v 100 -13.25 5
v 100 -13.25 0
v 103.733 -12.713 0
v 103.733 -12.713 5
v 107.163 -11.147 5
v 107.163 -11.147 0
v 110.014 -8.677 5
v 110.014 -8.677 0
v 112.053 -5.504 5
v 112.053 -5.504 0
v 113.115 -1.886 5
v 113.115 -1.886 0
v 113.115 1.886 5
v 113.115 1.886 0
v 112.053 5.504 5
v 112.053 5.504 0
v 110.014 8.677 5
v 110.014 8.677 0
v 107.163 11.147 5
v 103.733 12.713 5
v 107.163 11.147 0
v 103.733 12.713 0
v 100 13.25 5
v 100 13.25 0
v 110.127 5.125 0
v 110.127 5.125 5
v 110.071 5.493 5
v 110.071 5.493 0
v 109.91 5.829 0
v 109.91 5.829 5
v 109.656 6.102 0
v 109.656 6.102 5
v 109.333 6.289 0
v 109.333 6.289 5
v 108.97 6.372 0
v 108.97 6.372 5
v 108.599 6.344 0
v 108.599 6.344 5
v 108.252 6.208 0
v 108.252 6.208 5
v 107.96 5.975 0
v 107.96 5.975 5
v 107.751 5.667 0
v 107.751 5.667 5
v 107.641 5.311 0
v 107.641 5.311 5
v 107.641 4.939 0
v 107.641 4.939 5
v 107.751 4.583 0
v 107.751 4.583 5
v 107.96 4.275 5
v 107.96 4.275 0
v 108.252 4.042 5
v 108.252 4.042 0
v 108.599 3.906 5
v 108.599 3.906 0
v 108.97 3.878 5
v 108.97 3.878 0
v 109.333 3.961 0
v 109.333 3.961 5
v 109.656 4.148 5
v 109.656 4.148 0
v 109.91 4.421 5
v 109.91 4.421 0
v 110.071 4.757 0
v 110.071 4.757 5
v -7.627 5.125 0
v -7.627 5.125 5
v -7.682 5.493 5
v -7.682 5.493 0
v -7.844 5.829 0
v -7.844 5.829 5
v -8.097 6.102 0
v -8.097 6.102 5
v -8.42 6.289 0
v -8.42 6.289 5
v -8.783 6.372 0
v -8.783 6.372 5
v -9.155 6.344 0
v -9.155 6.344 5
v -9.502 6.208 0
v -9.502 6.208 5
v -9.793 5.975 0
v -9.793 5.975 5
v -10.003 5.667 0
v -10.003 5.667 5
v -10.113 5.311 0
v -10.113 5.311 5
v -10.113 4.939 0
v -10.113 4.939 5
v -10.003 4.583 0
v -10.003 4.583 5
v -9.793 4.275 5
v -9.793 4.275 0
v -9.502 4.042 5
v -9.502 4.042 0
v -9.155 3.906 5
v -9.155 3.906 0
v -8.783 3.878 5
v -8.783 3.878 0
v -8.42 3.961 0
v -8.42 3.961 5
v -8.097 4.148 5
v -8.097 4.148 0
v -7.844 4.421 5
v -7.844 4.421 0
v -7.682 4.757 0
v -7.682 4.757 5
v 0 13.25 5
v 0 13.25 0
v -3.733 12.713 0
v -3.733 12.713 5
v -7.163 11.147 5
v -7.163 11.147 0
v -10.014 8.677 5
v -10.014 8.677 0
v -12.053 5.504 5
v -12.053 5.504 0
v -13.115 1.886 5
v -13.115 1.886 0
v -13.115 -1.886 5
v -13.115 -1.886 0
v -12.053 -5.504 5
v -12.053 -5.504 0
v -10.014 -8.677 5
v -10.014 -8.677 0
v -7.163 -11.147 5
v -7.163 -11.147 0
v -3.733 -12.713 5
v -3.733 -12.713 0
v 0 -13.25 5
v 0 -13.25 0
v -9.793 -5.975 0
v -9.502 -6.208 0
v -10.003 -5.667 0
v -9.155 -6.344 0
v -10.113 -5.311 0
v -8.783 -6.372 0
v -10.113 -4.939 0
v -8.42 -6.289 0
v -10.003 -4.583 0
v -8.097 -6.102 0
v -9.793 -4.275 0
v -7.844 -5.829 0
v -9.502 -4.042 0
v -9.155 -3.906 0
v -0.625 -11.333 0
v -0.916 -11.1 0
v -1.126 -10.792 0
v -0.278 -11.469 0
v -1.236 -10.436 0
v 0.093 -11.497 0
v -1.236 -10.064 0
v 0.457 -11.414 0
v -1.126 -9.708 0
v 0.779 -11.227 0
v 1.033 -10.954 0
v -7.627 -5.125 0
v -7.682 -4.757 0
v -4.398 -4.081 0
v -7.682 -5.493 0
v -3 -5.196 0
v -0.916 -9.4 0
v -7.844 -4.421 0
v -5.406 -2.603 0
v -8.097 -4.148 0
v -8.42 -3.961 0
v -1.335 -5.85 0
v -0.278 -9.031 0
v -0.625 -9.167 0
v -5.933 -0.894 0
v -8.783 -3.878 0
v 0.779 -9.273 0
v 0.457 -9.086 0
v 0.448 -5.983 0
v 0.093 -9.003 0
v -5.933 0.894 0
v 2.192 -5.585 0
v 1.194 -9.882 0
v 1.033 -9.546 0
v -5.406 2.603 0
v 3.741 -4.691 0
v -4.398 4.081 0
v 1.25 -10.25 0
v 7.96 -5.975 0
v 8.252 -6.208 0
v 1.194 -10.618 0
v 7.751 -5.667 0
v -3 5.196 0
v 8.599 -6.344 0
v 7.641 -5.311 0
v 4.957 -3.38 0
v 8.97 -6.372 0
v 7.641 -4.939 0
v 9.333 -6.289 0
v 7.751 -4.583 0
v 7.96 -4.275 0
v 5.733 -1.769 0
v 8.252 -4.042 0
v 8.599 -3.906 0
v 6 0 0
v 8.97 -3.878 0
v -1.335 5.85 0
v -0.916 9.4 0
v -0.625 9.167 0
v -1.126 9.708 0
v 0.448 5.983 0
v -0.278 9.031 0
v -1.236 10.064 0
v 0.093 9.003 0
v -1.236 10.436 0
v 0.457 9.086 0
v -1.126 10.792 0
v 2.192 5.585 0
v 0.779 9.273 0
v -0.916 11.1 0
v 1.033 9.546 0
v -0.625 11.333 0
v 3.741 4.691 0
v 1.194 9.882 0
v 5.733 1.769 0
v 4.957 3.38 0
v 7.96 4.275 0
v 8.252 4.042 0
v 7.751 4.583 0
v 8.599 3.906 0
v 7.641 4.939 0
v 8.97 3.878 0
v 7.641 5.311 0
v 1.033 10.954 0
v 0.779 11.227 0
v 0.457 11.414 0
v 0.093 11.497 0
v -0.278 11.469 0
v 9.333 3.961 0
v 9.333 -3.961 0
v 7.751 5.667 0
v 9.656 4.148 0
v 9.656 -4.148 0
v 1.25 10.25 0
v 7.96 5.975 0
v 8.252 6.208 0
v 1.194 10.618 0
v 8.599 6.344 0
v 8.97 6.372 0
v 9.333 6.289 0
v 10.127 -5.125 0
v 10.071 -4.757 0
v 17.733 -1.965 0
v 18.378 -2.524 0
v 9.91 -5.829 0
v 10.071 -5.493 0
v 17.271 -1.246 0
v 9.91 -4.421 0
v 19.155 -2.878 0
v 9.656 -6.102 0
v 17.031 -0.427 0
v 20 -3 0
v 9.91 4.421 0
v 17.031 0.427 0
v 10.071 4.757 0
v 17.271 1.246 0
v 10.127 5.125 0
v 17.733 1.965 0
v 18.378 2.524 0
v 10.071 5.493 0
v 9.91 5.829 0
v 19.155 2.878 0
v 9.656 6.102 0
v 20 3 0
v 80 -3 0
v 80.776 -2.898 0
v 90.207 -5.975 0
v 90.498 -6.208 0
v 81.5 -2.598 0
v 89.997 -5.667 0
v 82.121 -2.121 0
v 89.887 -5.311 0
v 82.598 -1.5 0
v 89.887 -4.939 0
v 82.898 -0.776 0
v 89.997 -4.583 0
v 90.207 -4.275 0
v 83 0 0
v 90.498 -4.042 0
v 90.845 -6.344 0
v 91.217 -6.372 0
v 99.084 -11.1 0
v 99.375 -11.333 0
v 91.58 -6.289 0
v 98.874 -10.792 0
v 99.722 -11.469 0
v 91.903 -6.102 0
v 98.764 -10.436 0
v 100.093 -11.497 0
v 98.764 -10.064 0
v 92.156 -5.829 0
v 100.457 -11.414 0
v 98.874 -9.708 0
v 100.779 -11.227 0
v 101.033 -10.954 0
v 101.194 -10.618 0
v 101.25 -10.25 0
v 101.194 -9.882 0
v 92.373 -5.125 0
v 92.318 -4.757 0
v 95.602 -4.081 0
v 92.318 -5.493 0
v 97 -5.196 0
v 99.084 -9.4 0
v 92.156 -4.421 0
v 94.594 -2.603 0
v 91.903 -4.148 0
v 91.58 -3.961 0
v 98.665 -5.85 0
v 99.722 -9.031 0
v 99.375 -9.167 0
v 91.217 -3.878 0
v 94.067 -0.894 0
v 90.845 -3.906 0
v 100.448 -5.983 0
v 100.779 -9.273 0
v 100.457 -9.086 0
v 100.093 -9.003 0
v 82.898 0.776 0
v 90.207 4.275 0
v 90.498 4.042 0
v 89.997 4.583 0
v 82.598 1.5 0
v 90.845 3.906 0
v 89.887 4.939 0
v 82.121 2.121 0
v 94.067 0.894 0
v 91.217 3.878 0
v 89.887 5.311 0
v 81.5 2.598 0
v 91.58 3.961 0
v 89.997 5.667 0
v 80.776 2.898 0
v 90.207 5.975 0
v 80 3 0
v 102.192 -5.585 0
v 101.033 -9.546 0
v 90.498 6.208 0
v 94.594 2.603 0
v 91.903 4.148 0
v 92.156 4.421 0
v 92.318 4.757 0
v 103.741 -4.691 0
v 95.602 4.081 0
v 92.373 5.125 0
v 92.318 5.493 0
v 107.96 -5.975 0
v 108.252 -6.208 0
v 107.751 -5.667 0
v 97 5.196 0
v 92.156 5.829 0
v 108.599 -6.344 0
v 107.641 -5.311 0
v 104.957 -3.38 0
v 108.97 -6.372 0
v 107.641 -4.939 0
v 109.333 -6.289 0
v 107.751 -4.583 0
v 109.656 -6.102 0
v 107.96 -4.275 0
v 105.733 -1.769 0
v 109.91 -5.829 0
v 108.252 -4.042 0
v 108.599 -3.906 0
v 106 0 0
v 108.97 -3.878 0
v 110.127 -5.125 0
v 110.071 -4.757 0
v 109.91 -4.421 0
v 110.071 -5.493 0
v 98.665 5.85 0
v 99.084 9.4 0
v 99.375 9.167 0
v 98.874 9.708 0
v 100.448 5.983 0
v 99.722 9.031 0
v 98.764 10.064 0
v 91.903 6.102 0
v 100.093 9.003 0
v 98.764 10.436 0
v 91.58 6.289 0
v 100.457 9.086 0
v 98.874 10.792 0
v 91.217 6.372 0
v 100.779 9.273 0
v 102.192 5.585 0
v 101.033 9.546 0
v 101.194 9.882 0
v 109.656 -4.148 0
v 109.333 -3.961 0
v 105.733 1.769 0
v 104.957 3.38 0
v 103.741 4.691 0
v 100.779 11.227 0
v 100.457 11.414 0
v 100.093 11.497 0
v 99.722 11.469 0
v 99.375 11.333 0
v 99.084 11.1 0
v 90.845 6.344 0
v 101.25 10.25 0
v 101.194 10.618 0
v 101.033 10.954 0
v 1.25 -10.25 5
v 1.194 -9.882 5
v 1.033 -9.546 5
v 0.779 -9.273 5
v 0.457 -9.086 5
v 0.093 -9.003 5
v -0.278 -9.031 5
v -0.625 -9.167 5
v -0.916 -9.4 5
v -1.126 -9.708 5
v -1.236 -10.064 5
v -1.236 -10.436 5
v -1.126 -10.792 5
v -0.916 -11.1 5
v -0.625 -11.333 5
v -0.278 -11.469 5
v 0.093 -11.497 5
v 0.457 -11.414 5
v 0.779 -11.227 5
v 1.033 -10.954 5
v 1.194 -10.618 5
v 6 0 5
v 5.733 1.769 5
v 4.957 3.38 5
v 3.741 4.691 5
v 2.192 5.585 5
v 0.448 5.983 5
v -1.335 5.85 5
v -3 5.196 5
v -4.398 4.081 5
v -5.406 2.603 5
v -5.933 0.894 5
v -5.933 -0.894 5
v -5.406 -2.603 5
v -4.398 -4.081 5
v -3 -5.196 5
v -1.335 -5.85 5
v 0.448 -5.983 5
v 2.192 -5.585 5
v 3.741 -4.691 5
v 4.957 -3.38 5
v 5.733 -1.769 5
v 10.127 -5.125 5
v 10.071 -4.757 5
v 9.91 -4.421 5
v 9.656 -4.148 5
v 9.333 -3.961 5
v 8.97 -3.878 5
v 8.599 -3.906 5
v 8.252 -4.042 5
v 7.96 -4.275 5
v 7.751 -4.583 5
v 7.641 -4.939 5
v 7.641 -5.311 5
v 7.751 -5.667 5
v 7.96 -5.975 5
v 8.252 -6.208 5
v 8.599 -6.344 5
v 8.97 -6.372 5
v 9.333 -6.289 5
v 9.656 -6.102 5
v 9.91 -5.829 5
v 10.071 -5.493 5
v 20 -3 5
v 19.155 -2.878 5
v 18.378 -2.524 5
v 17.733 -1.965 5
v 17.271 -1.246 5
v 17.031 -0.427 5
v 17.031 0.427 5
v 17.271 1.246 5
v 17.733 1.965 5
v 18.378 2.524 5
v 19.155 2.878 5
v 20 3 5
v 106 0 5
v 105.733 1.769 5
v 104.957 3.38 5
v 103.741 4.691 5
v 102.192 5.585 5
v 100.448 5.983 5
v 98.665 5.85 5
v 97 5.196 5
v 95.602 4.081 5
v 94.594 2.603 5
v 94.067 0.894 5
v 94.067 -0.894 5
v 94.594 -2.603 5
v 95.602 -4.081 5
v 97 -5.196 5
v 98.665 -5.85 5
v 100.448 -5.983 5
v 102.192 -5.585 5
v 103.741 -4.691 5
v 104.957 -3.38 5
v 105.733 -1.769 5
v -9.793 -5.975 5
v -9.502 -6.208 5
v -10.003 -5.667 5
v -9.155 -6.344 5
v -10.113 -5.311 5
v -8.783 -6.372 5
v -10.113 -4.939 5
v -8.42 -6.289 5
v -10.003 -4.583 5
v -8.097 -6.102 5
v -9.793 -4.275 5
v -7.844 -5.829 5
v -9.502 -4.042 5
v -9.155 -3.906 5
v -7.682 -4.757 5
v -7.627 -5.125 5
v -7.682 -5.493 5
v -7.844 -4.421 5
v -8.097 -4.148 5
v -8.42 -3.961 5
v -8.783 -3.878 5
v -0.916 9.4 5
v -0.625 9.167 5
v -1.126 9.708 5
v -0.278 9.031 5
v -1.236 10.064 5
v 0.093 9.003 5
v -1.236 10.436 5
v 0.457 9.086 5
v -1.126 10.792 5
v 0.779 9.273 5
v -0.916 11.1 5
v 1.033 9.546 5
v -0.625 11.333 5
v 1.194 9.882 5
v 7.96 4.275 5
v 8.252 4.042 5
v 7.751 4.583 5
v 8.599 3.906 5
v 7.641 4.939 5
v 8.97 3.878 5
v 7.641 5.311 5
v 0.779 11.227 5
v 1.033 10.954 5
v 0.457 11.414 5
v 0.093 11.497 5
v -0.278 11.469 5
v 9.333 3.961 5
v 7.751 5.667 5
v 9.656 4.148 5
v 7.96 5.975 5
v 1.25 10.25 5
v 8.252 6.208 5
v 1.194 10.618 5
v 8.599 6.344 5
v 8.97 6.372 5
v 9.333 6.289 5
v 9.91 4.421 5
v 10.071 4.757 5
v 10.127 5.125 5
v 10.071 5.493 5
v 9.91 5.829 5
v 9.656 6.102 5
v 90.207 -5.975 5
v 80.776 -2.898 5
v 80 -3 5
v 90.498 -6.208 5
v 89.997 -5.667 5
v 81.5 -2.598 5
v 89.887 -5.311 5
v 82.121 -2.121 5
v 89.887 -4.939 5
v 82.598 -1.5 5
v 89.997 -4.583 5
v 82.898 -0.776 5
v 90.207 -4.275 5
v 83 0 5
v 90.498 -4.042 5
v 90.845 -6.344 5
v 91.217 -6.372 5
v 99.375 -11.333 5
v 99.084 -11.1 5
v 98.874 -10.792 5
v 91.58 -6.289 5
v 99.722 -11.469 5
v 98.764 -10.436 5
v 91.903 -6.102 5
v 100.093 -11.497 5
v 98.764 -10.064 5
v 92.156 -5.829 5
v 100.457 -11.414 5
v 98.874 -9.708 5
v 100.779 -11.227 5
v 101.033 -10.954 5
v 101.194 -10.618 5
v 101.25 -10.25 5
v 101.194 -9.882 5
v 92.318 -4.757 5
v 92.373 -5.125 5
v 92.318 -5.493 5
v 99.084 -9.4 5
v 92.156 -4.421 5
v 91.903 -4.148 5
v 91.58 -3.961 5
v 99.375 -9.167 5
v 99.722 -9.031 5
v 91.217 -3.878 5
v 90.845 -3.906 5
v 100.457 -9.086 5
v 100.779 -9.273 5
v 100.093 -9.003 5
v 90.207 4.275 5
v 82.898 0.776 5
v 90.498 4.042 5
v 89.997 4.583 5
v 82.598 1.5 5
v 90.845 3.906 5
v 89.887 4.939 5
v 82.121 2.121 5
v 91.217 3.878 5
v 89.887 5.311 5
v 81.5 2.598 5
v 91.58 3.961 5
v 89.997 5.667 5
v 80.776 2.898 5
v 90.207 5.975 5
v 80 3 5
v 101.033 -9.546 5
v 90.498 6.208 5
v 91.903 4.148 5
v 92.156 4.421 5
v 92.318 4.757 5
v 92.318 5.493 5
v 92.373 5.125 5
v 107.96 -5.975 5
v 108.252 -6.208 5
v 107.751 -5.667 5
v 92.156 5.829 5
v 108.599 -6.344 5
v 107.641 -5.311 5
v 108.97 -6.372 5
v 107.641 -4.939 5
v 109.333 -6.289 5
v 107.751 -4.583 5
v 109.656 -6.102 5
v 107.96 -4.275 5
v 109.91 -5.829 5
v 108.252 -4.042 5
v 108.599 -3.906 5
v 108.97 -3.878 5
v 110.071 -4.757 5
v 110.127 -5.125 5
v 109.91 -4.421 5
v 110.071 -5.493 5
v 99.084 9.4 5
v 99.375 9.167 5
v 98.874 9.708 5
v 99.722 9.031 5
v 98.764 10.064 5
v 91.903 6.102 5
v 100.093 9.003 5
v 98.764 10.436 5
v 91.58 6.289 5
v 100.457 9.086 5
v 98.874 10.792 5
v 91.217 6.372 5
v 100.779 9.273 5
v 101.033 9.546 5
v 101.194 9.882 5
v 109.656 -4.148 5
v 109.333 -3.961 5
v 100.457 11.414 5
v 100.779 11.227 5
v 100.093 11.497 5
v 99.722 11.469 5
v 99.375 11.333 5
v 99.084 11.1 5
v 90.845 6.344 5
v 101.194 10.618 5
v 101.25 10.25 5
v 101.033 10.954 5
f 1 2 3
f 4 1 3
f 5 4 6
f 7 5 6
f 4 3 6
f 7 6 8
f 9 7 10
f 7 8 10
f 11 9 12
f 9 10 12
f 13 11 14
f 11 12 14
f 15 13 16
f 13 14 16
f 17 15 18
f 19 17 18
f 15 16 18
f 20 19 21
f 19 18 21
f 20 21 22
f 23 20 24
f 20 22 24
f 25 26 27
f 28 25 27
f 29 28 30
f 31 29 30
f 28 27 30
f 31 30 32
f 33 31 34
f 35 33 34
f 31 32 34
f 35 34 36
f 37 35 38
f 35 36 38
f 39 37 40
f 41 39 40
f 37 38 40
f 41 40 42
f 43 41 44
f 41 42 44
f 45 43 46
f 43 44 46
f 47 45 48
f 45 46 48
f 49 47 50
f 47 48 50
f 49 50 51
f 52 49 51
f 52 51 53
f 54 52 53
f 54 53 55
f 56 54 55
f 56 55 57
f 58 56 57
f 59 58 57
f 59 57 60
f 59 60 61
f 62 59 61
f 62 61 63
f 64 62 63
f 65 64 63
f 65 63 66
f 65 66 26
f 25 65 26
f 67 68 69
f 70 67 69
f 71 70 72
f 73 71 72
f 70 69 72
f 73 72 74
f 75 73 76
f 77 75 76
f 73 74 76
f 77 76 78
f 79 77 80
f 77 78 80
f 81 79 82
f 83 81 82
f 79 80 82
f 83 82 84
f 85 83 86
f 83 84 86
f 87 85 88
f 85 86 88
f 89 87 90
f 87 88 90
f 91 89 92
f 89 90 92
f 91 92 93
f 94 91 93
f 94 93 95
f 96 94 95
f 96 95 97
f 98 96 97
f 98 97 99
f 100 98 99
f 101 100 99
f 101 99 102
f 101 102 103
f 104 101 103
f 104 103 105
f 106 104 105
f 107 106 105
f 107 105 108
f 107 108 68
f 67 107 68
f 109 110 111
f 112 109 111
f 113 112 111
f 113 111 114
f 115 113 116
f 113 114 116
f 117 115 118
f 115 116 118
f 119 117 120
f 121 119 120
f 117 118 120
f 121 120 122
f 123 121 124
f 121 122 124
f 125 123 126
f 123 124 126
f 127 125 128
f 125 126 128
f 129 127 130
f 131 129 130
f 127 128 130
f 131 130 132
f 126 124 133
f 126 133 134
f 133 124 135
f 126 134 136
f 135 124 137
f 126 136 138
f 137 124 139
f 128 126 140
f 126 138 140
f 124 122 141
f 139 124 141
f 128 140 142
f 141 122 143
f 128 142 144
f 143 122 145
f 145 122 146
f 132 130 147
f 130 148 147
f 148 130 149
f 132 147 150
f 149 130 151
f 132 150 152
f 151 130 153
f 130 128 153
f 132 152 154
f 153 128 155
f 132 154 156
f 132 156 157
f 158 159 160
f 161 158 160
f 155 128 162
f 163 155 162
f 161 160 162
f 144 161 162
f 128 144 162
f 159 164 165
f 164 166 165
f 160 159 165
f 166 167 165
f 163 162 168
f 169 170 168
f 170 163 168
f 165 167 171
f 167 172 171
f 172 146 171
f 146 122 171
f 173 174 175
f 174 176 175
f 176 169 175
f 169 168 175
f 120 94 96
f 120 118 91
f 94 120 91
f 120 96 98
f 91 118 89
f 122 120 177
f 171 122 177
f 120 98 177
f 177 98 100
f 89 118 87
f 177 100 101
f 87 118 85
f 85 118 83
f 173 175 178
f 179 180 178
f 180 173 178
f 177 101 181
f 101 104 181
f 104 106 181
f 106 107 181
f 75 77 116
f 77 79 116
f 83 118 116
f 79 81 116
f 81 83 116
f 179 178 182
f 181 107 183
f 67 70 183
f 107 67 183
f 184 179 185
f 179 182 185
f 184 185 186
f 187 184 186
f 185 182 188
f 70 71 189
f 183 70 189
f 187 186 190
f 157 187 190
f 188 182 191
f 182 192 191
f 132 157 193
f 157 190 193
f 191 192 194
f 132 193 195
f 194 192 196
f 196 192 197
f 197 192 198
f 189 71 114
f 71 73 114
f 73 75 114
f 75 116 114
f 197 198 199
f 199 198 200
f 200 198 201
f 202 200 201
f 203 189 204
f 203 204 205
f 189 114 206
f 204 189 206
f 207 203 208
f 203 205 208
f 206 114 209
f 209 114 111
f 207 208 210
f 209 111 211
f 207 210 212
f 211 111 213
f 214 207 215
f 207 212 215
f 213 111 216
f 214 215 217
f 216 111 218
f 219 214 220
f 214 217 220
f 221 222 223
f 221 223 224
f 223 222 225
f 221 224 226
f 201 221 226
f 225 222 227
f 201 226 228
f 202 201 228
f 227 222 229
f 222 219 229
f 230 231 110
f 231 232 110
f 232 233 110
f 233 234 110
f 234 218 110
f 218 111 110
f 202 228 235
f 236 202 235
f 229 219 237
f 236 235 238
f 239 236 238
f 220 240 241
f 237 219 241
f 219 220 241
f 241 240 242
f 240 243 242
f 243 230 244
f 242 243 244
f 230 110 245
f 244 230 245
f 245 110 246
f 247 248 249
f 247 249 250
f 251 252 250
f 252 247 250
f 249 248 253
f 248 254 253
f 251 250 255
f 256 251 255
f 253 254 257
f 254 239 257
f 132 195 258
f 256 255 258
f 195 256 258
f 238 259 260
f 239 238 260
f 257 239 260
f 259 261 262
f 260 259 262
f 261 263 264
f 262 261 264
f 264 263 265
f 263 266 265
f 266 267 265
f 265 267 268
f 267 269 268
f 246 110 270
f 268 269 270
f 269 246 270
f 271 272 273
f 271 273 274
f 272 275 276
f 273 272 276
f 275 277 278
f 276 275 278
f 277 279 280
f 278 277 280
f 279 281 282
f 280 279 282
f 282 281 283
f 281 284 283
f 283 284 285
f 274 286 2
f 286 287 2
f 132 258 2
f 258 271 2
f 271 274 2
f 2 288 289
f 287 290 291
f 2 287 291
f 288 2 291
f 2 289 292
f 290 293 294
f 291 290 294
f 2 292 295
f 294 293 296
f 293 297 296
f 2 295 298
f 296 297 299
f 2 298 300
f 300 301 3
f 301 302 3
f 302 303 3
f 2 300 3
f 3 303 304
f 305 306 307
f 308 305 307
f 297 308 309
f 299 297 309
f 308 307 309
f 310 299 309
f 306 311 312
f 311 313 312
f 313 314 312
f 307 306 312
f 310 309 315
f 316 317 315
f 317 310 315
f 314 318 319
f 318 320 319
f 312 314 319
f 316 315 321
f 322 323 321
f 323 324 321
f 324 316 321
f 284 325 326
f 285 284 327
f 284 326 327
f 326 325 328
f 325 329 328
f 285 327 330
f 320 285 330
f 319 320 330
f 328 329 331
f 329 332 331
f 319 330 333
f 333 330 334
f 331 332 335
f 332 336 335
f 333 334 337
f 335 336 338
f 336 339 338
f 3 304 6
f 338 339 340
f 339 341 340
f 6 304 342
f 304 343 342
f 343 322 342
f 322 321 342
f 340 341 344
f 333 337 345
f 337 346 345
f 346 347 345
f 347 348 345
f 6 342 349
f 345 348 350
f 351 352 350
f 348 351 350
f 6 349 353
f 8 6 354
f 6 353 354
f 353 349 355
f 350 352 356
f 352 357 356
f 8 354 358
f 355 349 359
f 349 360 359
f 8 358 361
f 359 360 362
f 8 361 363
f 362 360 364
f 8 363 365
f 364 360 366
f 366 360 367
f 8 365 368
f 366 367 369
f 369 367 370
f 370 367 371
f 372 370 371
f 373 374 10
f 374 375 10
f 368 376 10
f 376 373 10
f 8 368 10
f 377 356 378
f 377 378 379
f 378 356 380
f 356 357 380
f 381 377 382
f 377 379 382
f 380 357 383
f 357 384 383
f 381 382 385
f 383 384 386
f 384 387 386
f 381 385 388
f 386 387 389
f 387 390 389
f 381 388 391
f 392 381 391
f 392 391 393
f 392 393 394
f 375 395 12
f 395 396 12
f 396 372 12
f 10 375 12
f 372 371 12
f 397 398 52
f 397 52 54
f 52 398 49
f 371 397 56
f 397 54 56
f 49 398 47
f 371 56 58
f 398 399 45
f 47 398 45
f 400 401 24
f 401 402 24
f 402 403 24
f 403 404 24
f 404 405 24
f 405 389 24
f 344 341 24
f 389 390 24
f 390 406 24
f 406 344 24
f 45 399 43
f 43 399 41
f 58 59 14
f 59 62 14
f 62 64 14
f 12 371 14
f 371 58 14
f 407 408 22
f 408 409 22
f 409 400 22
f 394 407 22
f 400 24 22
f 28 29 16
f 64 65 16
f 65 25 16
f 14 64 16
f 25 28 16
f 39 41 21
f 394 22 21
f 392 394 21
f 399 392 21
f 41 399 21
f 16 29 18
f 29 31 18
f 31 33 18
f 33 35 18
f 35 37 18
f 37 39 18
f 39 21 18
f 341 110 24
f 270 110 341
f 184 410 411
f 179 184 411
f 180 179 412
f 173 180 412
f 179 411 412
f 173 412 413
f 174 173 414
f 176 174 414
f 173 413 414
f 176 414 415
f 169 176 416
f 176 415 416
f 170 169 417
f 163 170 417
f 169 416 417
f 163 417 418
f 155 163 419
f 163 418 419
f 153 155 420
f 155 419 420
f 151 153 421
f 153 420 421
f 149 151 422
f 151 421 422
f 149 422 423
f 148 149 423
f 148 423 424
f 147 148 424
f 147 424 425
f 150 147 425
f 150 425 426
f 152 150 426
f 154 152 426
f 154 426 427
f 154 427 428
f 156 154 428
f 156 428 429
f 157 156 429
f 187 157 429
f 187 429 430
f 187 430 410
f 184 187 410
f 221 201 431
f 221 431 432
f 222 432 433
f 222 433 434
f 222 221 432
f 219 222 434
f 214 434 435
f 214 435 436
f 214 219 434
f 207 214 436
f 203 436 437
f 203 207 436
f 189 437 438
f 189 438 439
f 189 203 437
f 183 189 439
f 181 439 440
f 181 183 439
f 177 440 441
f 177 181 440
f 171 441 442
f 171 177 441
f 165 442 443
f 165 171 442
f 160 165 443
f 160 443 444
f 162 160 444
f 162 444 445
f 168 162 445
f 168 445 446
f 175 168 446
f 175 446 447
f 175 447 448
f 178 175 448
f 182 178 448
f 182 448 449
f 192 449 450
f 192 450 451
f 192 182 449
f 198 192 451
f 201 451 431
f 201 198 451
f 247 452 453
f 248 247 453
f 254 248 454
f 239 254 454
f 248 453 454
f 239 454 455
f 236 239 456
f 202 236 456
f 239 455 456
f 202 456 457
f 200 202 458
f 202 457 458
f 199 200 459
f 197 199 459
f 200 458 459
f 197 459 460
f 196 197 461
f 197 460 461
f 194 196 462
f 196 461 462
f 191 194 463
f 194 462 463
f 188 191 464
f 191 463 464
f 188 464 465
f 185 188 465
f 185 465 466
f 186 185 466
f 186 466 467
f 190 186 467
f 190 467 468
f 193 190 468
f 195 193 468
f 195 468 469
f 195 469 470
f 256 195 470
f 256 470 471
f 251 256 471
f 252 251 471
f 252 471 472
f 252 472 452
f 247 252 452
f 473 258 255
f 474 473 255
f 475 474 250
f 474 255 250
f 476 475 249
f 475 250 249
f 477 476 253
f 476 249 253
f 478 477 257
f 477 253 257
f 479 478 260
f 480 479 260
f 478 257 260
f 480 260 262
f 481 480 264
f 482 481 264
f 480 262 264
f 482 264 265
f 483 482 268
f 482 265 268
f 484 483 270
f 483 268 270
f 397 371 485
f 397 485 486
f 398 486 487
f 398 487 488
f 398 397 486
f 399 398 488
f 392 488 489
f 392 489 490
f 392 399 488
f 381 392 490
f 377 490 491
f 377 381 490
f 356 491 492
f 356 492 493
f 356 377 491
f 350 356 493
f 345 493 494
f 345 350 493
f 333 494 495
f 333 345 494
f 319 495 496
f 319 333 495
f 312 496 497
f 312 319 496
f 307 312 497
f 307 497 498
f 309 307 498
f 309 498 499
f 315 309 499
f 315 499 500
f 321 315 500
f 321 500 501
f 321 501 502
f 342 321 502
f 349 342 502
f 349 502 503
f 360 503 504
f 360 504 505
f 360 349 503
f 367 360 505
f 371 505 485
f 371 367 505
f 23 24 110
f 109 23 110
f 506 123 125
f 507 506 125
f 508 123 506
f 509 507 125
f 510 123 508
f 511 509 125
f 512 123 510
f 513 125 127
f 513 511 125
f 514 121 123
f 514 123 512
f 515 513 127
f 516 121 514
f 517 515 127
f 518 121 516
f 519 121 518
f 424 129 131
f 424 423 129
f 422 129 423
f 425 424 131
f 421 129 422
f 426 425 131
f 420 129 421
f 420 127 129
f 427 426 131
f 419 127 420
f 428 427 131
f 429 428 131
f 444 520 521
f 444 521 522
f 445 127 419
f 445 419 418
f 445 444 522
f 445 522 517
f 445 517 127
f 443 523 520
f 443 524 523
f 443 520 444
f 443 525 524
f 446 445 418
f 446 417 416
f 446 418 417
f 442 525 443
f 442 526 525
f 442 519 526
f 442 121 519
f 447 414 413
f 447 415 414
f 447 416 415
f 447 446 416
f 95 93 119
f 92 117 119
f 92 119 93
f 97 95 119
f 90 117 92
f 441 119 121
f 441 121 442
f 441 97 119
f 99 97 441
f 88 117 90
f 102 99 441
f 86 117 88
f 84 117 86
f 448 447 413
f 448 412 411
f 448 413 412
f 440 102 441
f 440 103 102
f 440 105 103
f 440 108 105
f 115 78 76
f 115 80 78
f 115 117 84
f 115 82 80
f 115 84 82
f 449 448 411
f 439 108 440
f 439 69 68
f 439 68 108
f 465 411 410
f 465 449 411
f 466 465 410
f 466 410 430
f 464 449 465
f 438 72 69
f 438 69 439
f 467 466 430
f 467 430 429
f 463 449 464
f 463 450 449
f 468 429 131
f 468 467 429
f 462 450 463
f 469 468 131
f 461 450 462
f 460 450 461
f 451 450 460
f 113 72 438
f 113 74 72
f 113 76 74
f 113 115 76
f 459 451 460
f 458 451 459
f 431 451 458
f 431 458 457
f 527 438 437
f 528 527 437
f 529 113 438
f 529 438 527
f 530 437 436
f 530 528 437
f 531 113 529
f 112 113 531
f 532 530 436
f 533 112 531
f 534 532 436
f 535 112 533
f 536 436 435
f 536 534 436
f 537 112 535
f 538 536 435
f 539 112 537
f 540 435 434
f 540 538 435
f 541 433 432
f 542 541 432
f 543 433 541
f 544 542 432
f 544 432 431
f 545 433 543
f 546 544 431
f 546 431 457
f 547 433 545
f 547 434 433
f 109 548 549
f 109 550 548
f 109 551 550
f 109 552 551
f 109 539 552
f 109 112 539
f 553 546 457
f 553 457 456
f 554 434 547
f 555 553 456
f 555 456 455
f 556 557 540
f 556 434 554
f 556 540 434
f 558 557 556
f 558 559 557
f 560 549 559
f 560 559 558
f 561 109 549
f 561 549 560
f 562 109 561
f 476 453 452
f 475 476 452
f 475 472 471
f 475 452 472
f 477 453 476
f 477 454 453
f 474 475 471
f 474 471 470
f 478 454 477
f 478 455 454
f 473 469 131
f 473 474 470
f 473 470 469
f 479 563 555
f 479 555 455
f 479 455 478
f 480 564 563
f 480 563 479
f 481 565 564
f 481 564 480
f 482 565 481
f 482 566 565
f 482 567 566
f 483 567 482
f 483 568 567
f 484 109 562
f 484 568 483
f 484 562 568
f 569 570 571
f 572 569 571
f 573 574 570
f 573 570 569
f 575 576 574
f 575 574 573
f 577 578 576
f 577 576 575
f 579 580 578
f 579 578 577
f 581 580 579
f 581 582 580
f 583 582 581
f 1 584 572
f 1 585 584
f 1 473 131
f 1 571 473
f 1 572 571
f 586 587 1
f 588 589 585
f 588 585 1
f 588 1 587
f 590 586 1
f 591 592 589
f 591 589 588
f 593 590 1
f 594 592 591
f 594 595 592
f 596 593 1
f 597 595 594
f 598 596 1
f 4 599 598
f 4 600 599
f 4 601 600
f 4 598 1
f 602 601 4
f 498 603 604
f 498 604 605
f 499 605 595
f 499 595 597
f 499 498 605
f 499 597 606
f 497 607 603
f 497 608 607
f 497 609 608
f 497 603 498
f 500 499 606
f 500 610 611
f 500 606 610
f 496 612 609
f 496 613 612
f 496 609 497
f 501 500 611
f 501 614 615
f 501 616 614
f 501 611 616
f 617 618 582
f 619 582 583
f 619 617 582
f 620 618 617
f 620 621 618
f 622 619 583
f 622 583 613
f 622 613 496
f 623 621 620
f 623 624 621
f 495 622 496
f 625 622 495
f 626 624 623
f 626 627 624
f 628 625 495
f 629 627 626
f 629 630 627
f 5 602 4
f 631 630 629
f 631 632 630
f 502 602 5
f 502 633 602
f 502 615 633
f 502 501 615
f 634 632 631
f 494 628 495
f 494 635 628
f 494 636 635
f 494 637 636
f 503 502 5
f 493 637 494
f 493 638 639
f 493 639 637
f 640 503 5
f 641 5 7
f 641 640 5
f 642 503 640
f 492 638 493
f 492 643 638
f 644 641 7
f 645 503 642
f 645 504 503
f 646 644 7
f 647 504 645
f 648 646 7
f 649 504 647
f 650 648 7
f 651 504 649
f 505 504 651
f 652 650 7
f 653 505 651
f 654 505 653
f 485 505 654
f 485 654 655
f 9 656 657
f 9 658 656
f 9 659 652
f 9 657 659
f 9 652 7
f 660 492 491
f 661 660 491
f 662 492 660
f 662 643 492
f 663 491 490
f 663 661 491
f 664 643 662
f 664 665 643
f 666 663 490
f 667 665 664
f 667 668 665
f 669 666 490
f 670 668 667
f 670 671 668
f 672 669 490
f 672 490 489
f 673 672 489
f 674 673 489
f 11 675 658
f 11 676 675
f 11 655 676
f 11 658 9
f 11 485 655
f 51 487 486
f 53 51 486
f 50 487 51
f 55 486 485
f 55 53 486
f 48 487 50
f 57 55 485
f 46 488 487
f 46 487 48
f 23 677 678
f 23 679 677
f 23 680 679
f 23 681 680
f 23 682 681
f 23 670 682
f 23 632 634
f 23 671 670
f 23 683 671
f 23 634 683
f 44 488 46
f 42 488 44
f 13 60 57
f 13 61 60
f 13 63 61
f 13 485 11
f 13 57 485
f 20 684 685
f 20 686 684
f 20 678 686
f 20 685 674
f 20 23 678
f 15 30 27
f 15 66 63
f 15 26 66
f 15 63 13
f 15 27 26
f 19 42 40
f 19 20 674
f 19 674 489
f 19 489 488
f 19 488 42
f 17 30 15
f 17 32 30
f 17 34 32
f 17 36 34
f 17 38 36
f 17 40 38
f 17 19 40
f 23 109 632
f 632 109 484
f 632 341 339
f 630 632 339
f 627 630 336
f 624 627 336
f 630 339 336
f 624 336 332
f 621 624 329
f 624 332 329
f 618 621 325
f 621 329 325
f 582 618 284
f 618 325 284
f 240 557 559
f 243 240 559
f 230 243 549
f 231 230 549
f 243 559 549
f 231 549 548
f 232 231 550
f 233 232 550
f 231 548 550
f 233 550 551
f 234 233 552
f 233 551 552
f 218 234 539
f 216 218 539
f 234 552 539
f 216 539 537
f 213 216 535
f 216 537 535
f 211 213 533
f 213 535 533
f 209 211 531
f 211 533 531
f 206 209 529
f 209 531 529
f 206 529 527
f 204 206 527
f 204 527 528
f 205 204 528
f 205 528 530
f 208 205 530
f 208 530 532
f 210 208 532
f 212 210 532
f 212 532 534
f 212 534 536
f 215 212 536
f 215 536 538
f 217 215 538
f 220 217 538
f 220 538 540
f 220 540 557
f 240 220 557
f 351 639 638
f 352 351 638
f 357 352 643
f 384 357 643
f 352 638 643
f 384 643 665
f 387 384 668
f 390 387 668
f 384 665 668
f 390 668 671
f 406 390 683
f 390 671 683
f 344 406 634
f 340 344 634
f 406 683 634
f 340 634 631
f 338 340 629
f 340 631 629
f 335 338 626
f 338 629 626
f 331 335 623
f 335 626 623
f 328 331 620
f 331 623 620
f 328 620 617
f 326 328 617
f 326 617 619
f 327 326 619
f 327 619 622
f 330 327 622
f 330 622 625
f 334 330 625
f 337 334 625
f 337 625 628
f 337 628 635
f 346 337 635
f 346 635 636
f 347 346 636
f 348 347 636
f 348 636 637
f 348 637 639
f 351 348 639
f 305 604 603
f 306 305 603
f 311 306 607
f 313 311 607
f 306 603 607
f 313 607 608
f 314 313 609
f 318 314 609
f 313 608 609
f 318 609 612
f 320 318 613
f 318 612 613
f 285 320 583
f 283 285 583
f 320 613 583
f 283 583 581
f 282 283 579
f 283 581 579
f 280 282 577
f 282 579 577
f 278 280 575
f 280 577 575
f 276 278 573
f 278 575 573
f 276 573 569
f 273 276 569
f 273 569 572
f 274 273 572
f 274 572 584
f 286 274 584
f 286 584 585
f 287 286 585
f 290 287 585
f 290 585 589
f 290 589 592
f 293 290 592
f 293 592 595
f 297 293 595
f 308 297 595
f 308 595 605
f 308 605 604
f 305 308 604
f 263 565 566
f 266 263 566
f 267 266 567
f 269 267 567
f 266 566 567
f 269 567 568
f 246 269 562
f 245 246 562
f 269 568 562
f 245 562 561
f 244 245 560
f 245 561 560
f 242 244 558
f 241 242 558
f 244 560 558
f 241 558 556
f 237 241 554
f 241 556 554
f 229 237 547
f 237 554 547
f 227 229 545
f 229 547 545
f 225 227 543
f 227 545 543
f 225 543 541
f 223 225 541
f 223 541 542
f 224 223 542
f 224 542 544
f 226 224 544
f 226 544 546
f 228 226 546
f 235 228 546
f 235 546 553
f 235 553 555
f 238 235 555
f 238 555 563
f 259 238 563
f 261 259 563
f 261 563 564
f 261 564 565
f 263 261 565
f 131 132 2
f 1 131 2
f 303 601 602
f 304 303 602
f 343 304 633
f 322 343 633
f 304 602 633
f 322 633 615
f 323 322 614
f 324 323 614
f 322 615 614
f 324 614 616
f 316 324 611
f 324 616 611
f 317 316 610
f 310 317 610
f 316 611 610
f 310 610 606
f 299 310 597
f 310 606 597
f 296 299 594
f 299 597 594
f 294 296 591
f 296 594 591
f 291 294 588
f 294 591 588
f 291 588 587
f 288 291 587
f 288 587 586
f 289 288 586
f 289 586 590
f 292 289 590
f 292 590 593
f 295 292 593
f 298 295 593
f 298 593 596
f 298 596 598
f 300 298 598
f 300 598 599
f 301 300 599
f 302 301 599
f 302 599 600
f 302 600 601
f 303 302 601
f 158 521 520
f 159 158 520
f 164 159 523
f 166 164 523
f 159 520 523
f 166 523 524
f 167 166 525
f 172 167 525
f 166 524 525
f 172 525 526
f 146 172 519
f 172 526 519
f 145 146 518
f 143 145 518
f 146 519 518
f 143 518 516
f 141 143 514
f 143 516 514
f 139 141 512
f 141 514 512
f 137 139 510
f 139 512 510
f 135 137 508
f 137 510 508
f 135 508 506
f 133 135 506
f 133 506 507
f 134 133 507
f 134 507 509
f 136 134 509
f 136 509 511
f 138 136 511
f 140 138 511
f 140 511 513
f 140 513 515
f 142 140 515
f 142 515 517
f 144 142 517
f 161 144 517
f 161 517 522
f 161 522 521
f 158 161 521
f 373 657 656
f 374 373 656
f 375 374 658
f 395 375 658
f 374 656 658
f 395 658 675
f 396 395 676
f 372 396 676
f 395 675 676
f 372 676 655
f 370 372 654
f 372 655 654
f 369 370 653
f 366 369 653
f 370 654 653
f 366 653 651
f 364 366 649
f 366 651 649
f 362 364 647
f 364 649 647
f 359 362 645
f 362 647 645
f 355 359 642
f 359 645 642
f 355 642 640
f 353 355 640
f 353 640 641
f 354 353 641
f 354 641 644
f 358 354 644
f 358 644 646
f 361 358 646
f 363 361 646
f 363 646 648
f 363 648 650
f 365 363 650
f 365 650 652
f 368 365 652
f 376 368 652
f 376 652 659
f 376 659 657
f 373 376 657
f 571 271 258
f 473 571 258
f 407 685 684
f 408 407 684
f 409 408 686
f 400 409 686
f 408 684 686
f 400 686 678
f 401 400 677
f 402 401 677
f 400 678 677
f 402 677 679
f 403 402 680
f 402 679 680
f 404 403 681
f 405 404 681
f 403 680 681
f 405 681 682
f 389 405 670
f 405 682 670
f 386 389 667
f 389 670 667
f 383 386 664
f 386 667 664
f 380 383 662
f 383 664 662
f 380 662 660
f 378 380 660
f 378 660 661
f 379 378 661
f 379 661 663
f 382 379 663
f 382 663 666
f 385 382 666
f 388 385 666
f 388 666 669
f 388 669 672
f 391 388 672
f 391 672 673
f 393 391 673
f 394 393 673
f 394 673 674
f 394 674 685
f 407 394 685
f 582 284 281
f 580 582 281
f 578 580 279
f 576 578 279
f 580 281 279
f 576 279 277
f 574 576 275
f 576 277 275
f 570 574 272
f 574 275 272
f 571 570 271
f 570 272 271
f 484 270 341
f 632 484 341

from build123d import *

# Parameters (mm, degrees)
SKETCH1_R           = 13.25
SKETCH1_R_2         = 6
BOSS_EXTRUDE1_DEPTH = 5
SKETCH2_R           = 1.25
CUT_EXTRUDE1_DEPTH  = 6


with BuildPart() as part:
    # Sketch1 → Boss-Extrude1 (new body)
    with BuildSketch(Plane.XY):
        Circle(SKETCH1_R)
        Circle(SKETCH1_R_2, mode=Mode.SUBTRACT)
        with BuildLine():
            Line((100, 13.25), (0, 13.25))
            ThreePointArc((0, 13.25), (9.369164851, 9.369164851), (13.25, 0))
            ThreePointArc((13.25, 0), (9.369164851, -9.369164851), (0, -13.25))
            Line((0, -13.25), (100, -13.25))
            ThreePointArc((100, -13.25), (86.75, 0), (100, 13.25))
        make_face()
        with BuildLine():
            Line((80, -3), (50, -3))
            Line((50, -3), (20, -3))
            ThreePointArc((20, -3), (17, 0), (20, 3))
            Line((20, 3), (50, 3))
            Line((50, 3), (80, 3))
            ThreePointArc((80, 3), (82.121320344, 2.121320344), (83, 0))
            ThreePointArc((83, 0), (82.121320344, -2.121320344), (80, -3))
        make_face(mode=Mode.SUBTRACT)
        with Locations((100, 0)):
            Circle(SKETCH1_R)
        with Locations((100, 0)):
            Circle(SKETCH1_R_2, mode=Mode.SUBTRACT)
    extrude(amount=BOSS_EXTRUDE1_DEPTH)

    # Sketch2 → Cut-Extrude1 (cut, through all)
    with BuildSketch(Plane.XY.offset(5)):
        with Locations((100, 10.25)):
            Circle(SKETCH2_R)
        with Locations((108.876760389, 5.125)):
            Circle(SKETCH2_R)
        with Locations((8.876760389, 5.125)):
            Circle(SKETCH2_R)
        with Locations((8.876760389, -5.125)):
            Circle(SKETCH2_R)
        with Locations((-8.876760389, 5.125)):
            Circle(SKETCH2_R)
        with Locations((-8.876760389, -5.125)):
            Circle(SKETCH2_R)
        with Locations((0, -10.25)):
            Circle(SKETCH2_R)
        with Locations((0, 10.25)):
            Circle(SKETCH2_R)
        with Locations((91.123239611, 5.125)):
            Circle(SKETCH2_R)
        with Locations((108.876760389, -5.125)):
            Circle(SKETCH2_R)
        with Locations((100, -10.25)):
            Circle(SKETCH2_R)
        with Locations((91.123239611, -5.125)):
            Circle(SKETCH2_R)
    extrude(amount=-CUT_EXTRUDE1_DEPTH, mode=Mode.SUBTRACT)


solid = part.part
